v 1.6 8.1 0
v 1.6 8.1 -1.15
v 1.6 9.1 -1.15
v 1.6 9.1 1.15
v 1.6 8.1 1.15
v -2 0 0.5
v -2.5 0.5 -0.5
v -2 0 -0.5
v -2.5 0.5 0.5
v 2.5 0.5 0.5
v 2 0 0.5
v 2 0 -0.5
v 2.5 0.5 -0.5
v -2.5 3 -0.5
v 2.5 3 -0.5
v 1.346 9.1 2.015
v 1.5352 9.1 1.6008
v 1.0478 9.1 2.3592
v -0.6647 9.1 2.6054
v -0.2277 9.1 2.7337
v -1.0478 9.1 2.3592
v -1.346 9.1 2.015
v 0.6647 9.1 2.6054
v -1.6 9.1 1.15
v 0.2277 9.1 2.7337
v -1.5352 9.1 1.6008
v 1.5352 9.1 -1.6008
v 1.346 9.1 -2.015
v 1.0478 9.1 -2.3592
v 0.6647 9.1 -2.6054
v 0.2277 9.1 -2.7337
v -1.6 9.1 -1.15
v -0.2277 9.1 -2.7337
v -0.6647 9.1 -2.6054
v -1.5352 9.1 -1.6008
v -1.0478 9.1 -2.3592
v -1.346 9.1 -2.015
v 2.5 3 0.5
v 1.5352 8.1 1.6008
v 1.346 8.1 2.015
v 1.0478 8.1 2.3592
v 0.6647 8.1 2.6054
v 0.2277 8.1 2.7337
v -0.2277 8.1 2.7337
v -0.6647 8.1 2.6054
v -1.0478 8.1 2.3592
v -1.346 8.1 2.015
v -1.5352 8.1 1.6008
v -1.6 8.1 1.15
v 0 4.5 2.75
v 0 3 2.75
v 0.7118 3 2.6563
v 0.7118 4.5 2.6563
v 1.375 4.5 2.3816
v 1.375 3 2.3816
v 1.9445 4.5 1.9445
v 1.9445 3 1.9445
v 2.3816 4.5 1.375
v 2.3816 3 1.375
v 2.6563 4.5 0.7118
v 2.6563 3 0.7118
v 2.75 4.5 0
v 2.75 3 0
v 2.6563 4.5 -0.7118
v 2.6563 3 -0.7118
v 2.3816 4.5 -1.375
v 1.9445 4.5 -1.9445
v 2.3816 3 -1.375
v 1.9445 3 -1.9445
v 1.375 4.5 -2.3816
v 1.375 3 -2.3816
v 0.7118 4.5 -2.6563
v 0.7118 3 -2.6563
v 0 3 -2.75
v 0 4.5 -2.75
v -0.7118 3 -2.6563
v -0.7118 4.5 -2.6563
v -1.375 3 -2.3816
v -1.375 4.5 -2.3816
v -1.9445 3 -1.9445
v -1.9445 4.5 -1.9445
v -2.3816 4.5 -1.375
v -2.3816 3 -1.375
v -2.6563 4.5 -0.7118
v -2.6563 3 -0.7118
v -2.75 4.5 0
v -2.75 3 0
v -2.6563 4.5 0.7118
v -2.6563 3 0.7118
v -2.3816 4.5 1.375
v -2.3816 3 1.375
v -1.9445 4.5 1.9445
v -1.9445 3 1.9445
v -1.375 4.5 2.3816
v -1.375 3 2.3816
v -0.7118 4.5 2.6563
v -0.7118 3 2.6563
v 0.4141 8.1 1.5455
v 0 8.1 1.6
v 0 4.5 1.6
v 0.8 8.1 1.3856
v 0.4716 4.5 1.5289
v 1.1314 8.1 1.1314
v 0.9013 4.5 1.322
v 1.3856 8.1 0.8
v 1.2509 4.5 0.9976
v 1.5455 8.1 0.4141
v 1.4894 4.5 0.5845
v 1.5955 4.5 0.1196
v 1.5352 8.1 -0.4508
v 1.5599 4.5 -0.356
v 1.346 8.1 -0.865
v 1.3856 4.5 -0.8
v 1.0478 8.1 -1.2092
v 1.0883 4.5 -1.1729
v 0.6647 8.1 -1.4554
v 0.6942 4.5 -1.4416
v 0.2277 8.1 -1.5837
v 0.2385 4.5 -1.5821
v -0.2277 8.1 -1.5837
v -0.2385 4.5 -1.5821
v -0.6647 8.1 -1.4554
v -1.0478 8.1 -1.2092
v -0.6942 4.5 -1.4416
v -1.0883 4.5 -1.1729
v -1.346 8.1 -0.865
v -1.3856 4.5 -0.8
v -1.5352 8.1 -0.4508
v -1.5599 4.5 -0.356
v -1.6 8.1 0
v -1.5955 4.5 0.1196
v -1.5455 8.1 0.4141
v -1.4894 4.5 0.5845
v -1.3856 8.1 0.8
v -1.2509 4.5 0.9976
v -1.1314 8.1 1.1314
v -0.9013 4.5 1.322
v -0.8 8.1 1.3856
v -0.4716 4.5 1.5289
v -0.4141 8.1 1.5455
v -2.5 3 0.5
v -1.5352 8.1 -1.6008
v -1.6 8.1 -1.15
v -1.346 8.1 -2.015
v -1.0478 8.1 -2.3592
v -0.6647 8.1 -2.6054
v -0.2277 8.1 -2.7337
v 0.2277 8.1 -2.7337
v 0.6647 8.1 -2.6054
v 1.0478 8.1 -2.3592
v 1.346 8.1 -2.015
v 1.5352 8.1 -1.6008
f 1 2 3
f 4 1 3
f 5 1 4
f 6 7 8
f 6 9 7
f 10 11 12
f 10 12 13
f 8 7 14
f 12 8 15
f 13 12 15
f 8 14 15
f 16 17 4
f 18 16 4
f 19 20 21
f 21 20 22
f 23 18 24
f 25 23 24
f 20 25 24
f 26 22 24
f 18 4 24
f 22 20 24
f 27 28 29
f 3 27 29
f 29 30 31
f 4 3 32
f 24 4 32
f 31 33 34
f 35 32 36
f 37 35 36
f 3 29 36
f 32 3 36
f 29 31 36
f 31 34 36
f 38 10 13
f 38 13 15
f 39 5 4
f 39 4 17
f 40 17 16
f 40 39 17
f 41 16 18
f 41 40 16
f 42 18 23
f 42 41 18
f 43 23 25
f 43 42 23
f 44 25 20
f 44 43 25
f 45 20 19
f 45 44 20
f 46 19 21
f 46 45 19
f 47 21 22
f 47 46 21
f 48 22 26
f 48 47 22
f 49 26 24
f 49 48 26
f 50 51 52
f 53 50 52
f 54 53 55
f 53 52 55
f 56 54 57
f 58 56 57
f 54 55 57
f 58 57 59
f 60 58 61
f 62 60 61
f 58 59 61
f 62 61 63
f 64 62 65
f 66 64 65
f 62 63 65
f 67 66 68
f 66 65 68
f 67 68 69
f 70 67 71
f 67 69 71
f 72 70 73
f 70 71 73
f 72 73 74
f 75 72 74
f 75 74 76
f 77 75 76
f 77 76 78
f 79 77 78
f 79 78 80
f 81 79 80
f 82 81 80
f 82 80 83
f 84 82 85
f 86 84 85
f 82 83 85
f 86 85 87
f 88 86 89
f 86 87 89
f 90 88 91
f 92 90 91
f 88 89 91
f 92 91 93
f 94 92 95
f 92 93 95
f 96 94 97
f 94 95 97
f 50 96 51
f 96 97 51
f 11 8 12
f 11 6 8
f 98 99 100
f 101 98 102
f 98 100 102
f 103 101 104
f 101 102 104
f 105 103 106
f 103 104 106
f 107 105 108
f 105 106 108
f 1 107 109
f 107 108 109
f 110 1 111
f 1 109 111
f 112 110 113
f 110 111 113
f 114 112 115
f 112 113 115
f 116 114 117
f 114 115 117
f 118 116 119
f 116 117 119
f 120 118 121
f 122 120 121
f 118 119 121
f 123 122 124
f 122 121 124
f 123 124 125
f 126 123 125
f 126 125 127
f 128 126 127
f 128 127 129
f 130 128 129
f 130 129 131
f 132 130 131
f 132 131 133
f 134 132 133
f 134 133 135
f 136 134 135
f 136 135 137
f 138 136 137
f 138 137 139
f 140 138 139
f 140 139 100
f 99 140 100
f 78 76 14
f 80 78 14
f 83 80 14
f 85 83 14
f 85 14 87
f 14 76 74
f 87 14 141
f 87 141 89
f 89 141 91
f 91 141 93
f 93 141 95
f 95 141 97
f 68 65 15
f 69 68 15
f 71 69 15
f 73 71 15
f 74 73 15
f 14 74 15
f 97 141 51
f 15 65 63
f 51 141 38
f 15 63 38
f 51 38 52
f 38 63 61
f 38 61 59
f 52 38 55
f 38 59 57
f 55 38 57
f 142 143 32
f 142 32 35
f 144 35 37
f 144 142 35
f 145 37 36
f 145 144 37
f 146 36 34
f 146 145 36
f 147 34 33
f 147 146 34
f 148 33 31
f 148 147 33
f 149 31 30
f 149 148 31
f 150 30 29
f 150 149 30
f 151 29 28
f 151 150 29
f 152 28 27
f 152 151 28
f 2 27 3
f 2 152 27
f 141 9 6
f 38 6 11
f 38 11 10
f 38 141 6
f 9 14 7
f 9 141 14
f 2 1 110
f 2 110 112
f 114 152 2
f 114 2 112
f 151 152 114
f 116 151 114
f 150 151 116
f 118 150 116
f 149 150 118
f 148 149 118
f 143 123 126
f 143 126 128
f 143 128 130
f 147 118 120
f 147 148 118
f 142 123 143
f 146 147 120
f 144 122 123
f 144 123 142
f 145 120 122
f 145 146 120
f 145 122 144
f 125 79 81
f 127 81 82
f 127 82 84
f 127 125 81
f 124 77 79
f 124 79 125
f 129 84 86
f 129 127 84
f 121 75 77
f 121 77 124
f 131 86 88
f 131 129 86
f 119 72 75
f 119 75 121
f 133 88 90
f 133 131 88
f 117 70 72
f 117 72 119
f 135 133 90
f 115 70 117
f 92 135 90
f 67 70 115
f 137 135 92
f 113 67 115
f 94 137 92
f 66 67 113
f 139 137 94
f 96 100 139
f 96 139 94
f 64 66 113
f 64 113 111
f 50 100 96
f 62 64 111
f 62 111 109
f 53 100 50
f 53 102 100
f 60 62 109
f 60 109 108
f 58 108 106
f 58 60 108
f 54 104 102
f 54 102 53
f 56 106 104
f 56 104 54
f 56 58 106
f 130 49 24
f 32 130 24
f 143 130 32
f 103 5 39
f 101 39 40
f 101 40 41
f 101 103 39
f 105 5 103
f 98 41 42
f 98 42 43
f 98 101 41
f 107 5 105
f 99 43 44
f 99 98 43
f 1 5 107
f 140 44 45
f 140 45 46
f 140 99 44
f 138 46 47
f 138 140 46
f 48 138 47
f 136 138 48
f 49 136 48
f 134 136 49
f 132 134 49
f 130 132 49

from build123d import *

# Parameters (mm, degrees)
EXTRUDE_1_DEPTH = 0.5
SKETCH_3_R      = 2.75
EXTRUDE_2_DEPTH = 1.5
SKETCH_5_R      = 1.6
EXTRUDE_3_DEPTH = 3.6
EXTRUDE_4_DEPTH = 1


with BuildPart() as part:
    # ｽｹｯﾁ2 → ﾎﾞｽ - 押し出し1 (new, symmetric)
    with BuildSketch(Plane.XY):
        Polygon((-2, 0), (2, 0), (2.5, 0.5), (2.5, 3), (-2.5, 3), (-2.5, 0.5), align=None)
    extrude(amount=EXTRUDE_1_DEPTH, both=True)

    # ｽｹｯﾁ3 → ﾎﾞｽ - 押し出し2 (add)
    with BuildSketch(Plane(origin=(0, 3, 0), x_dir=(1, 0, 0), z_dir=(0, 1, 0))):
        with Locations(Location((0, 0, 0), (0, 0, 270))):
            Circle(SKETCH_3_R)
    extrude(amount=EXTRUDE_2_DEPTH)

    # ｽｹｯﾁ5 → ﾎﾞｽ - 押し出し3 (add)
    with BuildSketch(Plane(origin=(0, 4.5, 0), x_dir=(1, 0, 0), z_dir=(0, 1, 0))):
        with Locations(Location((0, 0, 0), (0, 0, 270))):
            Circle(SKETCH_5_R)
    extrude(amount=EXTRUDE_3_DEPTH)

    # ｽｹｯﾁ6 → ﾎﾞｽ - 押し出し4 (add)
    with BuildSketch(Plane(origin=(0, 8.1, 0), x_dir=(1, 0, 0), z_dir=(0, 1, 0))):
        with BuildLine():
            Line((-1.6, -1.15), (-1.6, 1.15))
            ThreePointArc((-1.6, 1.15), (0, 2.75), (1.6, 1.15))
            Line((1.6, 1.15), (1.6, -1.15))
            ThreePointArc((1.6, -1.15), (0, -2.75), (-1.6, -1.15))
        make_face()
    extrude(amount=EXTRUDE_4_DEPTH)


solid = part.part
